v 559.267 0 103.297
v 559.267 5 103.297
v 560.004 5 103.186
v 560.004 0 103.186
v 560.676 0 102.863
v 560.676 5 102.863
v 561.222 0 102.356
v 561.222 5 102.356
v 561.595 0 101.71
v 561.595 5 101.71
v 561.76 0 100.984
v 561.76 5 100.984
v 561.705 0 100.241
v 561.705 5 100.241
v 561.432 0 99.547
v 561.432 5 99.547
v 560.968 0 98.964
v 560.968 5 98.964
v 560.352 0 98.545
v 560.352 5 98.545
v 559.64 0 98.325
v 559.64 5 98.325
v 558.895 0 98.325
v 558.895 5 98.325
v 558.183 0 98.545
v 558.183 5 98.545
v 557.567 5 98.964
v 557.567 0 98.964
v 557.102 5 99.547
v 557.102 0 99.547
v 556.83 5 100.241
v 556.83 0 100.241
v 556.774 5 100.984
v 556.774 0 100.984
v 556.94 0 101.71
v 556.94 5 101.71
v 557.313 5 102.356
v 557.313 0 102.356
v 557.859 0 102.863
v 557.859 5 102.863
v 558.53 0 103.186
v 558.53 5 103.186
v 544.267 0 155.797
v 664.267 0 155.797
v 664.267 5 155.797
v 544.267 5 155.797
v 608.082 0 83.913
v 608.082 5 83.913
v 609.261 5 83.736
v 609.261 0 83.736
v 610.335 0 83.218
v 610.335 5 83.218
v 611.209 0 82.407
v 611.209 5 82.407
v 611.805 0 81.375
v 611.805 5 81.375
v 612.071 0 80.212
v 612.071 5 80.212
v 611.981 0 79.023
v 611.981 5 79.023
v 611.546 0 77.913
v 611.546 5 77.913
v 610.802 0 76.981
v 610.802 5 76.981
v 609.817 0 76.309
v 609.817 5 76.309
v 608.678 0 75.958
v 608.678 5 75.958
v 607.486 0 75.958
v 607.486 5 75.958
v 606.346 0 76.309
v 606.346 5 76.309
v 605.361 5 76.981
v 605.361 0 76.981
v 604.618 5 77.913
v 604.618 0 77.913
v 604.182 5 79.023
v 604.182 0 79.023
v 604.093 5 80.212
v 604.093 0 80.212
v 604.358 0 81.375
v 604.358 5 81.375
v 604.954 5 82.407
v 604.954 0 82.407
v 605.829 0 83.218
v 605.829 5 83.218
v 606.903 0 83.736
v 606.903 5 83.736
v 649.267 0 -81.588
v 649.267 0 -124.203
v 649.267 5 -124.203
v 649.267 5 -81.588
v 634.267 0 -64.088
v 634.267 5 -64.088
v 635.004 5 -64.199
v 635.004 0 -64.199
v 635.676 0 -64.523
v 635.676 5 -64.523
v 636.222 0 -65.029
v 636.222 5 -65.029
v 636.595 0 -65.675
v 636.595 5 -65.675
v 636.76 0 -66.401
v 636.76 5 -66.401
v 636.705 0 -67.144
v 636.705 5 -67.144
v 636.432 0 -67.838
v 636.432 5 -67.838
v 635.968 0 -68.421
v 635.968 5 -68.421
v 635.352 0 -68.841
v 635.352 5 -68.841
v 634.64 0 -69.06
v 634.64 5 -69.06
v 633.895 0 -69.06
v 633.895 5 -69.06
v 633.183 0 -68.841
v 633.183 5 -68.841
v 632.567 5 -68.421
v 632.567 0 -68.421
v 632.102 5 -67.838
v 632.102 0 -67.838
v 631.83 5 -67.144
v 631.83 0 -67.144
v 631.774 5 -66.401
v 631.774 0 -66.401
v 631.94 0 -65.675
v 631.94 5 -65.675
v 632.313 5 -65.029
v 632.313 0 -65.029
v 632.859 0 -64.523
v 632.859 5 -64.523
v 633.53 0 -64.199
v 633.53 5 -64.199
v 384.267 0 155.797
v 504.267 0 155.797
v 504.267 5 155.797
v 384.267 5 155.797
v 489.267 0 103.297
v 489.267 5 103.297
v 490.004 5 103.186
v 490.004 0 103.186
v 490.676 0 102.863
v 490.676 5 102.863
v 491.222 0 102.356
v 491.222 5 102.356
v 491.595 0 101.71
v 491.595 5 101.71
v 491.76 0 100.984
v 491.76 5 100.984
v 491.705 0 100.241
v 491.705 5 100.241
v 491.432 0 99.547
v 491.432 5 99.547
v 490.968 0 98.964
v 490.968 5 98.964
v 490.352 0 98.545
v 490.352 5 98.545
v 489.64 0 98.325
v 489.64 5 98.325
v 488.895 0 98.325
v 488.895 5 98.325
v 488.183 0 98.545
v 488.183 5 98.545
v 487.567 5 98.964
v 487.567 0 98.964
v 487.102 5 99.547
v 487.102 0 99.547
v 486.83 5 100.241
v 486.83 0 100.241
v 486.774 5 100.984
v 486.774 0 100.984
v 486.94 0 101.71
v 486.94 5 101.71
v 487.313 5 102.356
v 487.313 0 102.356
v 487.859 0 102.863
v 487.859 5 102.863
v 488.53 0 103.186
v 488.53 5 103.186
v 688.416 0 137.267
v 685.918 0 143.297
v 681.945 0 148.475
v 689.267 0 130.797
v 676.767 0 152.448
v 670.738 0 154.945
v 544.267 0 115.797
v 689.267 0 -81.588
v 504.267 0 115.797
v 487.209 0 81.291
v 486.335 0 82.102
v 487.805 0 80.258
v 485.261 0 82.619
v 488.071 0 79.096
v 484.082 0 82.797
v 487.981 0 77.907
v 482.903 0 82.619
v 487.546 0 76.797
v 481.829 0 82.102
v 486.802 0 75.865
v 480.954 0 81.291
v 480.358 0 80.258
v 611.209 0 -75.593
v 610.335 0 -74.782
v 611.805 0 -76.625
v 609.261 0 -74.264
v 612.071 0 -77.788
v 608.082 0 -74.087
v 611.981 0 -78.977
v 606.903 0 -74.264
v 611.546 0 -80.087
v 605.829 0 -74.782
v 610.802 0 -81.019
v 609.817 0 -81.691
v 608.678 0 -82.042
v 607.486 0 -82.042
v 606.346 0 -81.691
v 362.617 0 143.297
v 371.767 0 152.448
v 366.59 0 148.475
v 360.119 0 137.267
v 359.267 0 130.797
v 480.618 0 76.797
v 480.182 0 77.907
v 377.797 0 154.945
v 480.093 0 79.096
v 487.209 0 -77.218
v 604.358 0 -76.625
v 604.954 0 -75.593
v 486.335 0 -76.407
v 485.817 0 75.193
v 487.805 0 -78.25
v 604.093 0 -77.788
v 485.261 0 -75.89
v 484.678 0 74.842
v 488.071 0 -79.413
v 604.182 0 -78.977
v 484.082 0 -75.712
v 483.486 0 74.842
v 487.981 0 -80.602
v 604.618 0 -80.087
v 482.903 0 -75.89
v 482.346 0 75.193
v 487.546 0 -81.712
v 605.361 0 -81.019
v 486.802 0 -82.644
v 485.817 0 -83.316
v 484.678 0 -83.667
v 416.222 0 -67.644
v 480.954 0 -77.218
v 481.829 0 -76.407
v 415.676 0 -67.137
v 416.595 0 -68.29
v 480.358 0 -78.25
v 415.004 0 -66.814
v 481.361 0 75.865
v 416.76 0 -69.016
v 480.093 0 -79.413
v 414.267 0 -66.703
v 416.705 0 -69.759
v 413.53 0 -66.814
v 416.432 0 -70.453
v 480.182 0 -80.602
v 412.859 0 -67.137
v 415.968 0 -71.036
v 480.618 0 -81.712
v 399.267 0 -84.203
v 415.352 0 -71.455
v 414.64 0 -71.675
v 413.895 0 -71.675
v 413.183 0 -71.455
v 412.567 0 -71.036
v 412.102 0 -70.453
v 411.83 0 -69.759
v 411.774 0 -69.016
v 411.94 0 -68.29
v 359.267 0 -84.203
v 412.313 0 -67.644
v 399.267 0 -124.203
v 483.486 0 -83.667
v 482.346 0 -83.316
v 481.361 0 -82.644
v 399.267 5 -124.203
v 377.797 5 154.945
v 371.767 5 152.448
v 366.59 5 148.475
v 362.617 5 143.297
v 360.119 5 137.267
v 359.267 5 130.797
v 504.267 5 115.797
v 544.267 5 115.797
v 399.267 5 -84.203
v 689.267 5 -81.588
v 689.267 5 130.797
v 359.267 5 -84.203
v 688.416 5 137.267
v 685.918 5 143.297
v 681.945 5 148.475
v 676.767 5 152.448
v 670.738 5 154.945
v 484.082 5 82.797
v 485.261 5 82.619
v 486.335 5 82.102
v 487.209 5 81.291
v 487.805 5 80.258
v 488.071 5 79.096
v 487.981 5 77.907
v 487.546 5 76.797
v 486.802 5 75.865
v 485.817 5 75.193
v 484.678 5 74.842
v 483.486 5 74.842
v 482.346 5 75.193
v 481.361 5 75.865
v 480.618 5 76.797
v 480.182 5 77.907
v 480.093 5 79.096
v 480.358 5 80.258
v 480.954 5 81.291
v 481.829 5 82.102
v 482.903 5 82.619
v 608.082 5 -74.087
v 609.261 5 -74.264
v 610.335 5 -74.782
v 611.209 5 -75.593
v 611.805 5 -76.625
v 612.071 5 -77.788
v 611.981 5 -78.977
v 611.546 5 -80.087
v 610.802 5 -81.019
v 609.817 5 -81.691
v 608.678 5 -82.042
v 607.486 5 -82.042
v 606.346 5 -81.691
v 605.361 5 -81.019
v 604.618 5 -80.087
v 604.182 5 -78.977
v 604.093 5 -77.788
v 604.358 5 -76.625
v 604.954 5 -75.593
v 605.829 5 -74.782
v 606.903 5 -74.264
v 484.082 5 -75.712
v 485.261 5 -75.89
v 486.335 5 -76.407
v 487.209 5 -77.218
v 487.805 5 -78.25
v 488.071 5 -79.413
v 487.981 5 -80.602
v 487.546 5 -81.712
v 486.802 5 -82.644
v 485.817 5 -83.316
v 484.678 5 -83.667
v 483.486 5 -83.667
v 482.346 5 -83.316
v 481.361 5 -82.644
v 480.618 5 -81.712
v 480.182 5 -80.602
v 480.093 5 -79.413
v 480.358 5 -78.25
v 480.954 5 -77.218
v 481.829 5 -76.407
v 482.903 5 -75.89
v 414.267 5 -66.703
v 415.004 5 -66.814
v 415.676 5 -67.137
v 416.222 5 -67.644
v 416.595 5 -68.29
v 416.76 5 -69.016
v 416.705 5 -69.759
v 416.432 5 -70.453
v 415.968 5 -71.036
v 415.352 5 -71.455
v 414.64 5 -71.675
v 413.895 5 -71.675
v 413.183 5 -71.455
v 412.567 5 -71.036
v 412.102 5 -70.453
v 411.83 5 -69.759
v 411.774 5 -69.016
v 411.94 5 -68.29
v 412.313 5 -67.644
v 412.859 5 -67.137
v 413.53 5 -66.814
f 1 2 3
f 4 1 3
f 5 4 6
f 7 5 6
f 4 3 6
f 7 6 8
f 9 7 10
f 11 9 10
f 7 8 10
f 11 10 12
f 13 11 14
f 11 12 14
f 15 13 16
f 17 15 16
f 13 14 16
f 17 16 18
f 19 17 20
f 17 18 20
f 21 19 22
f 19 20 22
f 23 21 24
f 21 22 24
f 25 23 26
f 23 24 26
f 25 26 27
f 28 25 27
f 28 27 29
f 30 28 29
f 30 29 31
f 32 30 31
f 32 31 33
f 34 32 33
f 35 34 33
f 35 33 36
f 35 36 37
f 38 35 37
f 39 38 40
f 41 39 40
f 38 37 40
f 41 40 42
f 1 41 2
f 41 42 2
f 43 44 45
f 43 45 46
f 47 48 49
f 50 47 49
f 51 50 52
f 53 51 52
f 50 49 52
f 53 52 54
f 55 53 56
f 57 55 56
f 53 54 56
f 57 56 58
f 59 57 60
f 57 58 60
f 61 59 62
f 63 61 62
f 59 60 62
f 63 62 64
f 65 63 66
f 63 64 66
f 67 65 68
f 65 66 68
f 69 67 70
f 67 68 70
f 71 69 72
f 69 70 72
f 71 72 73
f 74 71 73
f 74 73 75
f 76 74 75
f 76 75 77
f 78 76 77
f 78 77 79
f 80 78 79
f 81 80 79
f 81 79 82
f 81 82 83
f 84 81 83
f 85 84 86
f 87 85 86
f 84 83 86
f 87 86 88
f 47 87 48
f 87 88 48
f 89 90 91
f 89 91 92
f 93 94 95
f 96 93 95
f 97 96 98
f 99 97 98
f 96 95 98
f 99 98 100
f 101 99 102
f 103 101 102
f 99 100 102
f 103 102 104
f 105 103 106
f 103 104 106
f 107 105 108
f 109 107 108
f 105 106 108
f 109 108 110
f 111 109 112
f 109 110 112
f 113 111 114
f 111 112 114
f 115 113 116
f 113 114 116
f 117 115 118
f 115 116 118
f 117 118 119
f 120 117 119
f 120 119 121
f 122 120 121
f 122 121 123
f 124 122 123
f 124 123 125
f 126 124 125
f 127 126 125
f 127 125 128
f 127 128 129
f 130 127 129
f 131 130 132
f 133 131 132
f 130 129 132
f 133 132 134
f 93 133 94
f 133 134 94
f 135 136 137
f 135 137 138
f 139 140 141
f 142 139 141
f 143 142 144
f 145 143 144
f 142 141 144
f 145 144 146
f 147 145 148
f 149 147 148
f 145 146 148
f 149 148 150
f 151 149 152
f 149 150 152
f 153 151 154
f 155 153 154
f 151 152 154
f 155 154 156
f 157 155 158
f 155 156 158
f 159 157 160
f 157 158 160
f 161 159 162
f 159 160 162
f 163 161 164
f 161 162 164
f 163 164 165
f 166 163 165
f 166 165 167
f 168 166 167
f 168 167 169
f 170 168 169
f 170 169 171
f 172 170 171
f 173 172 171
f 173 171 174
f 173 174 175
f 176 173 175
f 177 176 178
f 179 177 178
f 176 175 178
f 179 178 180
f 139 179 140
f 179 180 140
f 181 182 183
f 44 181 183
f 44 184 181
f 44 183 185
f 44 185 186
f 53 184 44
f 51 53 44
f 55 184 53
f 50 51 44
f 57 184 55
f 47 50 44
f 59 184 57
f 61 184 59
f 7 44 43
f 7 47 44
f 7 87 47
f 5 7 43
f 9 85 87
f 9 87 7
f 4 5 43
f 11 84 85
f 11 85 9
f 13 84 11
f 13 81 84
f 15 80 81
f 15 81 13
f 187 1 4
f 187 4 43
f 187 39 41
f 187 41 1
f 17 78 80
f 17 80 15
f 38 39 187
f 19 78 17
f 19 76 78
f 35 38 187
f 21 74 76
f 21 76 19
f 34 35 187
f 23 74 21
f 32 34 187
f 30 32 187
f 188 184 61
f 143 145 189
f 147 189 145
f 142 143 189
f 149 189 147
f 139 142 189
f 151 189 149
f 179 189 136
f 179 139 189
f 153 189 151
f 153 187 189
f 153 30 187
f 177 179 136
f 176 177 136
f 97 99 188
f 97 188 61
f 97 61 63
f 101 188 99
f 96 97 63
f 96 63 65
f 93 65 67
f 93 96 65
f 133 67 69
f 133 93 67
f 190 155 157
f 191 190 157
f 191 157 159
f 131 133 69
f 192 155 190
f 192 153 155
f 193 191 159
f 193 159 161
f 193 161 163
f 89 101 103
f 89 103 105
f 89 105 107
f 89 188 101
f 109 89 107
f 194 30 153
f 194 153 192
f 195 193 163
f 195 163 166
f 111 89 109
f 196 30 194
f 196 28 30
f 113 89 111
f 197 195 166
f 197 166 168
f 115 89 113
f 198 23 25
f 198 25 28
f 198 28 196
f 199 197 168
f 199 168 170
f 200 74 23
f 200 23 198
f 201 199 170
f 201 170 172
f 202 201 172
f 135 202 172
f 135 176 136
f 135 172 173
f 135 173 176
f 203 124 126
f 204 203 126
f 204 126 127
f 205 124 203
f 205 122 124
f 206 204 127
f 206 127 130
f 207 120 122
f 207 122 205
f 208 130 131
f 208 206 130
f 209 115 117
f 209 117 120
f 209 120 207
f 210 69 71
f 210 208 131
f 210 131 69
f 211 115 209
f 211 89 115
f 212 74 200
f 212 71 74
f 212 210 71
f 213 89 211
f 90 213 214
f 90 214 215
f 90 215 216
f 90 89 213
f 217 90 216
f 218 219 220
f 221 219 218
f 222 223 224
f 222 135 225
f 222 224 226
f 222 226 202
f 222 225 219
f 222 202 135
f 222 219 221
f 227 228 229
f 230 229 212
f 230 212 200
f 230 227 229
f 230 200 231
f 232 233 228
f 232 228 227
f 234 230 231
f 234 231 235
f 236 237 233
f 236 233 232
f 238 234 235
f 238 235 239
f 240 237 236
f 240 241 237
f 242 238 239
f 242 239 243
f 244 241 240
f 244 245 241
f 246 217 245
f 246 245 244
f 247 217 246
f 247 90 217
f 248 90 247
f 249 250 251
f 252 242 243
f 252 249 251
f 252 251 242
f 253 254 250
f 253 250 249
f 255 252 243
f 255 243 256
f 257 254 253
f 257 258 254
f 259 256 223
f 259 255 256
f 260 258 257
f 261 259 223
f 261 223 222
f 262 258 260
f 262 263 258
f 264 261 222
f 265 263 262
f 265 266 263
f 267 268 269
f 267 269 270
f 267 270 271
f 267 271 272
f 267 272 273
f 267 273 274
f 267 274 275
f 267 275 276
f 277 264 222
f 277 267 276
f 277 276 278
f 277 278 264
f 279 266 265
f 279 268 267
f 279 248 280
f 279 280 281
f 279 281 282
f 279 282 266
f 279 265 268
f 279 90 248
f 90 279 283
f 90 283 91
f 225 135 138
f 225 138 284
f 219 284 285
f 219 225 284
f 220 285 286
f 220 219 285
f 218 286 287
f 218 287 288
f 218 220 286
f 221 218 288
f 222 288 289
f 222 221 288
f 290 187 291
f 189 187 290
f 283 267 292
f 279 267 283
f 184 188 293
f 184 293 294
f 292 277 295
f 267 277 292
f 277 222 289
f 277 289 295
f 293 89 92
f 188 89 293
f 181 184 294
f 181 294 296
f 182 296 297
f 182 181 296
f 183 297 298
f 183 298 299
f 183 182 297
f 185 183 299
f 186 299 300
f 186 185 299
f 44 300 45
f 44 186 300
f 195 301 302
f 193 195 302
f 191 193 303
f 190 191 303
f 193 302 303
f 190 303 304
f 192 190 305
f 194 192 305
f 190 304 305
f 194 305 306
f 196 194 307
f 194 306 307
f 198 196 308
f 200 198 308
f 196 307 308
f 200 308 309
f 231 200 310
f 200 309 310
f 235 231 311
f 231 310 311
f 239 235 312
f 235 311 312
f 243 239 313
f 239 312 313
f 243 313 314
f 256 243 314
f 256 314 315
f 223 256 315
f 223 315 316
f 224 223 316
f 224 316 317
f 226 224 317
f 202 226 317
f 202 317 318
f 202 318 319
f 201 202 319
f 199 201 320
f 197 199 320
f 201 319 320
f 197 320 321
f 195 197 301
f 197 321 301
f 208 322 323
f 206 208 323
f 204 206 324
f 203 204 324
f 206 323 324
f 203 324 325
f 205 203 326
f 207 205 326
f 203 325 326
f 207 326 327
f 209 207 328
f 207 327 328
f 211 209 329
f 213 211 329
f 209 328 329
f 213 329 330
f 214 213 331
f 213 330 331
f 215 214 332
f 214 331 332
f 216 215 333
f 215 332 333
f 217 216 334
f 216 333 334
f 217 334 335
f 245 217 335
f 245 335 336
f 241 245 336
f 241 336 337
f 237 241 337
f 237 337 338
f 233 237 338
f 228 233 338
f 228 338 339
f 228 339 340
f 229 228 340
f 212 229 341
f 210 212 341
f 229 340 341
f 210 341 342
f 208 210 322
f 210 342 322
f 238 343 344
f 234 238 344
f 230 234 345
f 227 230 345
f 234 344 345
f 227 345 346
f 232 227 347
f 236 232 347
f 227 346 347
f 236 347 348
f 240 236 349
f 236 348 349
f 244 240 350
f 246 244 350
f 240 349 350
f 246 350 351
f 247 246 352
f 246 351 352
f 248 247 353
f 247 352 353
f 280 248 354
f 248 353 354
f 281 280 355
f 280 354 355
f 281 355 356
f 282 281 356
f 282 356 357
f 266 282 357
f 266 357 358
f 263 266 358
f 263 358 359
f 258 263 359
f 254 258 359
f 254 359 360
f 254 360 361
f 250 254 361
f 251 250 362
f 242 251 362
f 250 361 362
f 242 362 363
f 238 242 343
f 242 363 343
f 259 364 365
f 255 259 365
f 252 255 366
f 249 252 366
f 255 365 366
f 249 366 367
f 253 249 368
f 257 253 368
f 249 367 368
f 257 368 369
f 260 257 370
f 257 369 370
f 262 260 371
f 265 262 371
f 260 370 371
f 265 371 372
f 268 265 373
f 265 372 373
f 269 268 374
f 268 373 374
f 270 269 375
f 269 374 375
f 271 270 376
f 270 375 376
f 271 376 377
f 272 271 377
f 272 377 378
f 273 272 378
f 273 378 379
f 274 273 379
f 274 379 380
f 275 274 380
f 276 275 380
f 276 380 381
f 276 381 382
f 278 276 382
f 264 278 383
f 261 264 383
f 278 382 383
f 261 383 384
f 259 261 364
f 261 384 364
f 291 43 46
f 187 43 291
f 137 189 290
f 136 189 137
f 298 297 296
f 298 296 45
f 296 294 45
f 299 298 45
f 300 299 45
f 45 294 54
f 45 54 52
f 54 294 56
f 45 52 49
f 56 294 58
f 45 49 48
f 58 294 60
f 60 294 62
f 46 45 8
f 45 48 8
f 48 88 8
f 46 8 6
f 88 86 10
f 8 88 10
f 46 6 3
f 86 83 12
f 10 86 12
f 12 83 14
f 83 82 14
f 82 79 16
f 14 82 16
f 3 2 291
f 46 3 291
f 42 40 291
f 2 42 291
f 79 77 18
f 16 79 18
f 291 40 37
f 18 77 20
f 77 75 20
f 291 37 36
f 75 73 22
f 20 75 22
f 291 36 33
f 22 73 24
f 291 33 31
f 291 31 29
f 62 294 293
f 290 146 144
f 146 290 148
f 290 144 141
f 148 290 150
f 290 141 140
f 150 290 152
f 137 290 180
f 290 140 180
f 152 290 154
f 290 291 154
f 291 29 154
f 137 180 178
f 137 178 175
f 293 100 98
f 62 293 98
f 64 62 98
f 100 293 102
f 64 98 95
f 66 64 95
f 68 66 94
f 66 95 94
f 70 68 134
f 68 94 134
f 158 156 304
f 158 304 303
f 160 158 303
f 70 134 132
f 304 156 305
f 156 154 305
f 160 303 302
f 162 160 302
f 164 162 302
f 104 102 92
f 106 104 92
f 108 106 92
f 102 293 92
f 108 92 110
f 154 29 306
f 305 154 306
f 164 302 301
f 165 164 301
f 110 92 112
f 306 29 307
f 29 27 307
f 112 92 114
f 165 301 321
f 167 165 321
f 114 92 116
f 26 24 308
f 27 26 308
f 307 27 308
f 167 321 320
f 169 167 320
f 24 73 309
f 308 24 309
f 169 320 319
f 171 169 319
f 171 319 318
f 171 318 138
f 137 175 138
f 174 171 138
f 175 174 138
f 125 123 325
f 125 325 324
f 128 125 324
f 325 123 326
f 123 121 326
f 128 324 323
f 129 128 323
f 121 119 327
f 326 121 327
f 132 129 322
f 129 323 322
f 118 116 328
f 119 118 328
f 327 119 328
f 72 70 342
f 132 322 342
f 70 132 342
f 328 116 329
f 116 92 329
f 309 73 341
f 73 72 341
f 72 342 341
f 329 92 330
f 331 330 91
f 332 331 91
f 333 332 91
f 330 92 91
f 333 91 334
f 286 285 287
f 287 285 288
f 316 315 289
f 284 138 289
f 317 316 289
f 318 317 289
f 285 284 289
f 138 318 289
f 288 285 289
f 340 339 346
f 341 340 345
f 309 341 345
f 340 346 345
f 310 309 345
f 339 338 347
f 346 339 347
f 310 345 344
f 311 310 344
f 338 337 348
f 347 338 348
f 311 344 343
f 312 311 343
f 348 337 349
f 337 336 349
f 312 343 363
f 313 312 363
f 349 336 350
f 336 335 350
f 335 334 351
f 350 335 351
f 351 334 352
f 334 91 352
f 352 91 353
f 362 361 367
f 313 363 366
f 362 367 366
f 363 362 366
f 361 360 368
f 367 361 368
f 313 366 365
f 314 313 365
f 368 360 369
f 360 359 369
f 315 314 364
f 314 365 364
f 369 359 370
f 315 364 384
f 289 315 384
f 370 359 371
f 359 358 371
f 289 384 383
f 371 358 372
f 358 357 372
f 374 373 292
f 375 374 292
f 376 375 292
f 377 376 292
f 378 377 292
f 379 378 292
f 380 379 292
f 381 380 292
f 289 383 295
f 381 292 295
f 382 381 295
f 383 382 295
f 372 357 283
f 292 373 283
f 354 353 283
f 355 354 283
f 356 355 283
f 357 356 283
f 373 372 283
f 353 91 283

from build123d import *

# Parameters (mm, degrees)
RESSALTO_EXTRUS_O4_DEPTH = 5
ESBO_O2_R                = 2.5
CORTE_EXTRUS_O1_DEPTH    = 5
ESBO_O3_R                = 4
CORTE_EXTRUS_O2_DEPTH    = 5


with BuildPart() as part:
    # Esboço1 → Ressalto-extrusão4 (new body)
    with BuildSketch(Plane(origin=(0, 0, 0), x_dir=(1, 0, 0), z_dir=(0, 1, 0))):
        with BuildLine():
            Line((504.267355398, -155.796995794), (384.267355398, -155.796995794))
            ThreePointArc((384.267355398, -155.796995794), (366.589685869, -148.474665324), (359.267355398, -130.796995794))
            Line((359.267355398, -130.796995794), (359.267355398, 84.203004206))
            Line((359.267355398, 84.203004206), (399.267355398, 84.203004206))
            Line((399.267355398, 84.203004206), (399.267355398, 124.203004206))
            Line((399.267355398, 124.203004206), (649.267355398, 124.203004206))
            Line((649.267355398, 124.203004206), (649.267355398, 81.588187759))
            Line((649.267355398, 81.588187759), (689.267355398, 81.588187759))
            Line((689.267355398, 81.588187759), (689.267355398, -130.796995794))
            ThreePointArc((689.267355398, -130.796995794), (681.945024928, -148.474665324), (664.267355398, -155.796995794))
            Line((664.267355398, -155.796995794), (544.267355398, -155.796995794))
            Line((544.267355398, -155.796995794), (544.267355398, -115.796995794))
            Line((544.267355398, -115.796995794), (504.267355398, -115.796995794))
            Line((504.267355398, -115.796995794), (504.267355398, -155.796995794))
        make_face()
    extrude(amount=RESSALTO_EXTRUS_O4_DEPTH)

    # Esboço2 → Corte-extrusão1 (cut)
    with BuildSketch(Plane(origin=(0, 5, 0), x_dir=(1, 0, 0), z_dir=(0, 1, 0))):
        with Locations(Location((559.267355398, -100.796995794, 0), (0, 0, 270))):
            Circle(ESBO_O2_R)
        with Locations(Location((489.267355398, -100.796995794, 0), (0, 0, 270))):
            Circle(ESBO_O2_R)
        with Locations(Location((634.267355398, 66.588187759, 0), (0, 0, 270))):
            Circle(ESBO_O2_R)
        with Locations(Location((414.267355398, 69.203004206, 0), (0, 0, 270))):
            Circle(ESBO_O2_R)
    extrude(amount=-CORTE_EXTRUS_O1_DEPTH, mode=Mode.SUBTRACT)

    # Esboço3 → Corte-extrusão2 (cut)
    with BuildSketch(Plane(origin=(0, 5, 0), x_dir=(1, 0, 0), z_dir=(0, 1, 0))):
        with Locations(Location((608.081782449, -79.913221978, 0), (0, 0, 270))):
            Circle(ESBO_O3_R)
        with Locations(Location((484.081782449, -78.796995794, 0), (0, 0, 270))):
            Circle(ESBO_O3_R)
        with Locations(Location((484.081782449, 79.711850126, 0), (0, 0, 270))):
            Circle(ESBO_O3_R)
        with Locations(Location((608.081782449, 78.086778022, 0), (0, 0, 270))):
            Circle(ESBO_O3_R)
    extrude(amount=-CORTE_EXTRUS_O2_DEPTH, mode=Mode.SUBTRACT)


solid = part.part
